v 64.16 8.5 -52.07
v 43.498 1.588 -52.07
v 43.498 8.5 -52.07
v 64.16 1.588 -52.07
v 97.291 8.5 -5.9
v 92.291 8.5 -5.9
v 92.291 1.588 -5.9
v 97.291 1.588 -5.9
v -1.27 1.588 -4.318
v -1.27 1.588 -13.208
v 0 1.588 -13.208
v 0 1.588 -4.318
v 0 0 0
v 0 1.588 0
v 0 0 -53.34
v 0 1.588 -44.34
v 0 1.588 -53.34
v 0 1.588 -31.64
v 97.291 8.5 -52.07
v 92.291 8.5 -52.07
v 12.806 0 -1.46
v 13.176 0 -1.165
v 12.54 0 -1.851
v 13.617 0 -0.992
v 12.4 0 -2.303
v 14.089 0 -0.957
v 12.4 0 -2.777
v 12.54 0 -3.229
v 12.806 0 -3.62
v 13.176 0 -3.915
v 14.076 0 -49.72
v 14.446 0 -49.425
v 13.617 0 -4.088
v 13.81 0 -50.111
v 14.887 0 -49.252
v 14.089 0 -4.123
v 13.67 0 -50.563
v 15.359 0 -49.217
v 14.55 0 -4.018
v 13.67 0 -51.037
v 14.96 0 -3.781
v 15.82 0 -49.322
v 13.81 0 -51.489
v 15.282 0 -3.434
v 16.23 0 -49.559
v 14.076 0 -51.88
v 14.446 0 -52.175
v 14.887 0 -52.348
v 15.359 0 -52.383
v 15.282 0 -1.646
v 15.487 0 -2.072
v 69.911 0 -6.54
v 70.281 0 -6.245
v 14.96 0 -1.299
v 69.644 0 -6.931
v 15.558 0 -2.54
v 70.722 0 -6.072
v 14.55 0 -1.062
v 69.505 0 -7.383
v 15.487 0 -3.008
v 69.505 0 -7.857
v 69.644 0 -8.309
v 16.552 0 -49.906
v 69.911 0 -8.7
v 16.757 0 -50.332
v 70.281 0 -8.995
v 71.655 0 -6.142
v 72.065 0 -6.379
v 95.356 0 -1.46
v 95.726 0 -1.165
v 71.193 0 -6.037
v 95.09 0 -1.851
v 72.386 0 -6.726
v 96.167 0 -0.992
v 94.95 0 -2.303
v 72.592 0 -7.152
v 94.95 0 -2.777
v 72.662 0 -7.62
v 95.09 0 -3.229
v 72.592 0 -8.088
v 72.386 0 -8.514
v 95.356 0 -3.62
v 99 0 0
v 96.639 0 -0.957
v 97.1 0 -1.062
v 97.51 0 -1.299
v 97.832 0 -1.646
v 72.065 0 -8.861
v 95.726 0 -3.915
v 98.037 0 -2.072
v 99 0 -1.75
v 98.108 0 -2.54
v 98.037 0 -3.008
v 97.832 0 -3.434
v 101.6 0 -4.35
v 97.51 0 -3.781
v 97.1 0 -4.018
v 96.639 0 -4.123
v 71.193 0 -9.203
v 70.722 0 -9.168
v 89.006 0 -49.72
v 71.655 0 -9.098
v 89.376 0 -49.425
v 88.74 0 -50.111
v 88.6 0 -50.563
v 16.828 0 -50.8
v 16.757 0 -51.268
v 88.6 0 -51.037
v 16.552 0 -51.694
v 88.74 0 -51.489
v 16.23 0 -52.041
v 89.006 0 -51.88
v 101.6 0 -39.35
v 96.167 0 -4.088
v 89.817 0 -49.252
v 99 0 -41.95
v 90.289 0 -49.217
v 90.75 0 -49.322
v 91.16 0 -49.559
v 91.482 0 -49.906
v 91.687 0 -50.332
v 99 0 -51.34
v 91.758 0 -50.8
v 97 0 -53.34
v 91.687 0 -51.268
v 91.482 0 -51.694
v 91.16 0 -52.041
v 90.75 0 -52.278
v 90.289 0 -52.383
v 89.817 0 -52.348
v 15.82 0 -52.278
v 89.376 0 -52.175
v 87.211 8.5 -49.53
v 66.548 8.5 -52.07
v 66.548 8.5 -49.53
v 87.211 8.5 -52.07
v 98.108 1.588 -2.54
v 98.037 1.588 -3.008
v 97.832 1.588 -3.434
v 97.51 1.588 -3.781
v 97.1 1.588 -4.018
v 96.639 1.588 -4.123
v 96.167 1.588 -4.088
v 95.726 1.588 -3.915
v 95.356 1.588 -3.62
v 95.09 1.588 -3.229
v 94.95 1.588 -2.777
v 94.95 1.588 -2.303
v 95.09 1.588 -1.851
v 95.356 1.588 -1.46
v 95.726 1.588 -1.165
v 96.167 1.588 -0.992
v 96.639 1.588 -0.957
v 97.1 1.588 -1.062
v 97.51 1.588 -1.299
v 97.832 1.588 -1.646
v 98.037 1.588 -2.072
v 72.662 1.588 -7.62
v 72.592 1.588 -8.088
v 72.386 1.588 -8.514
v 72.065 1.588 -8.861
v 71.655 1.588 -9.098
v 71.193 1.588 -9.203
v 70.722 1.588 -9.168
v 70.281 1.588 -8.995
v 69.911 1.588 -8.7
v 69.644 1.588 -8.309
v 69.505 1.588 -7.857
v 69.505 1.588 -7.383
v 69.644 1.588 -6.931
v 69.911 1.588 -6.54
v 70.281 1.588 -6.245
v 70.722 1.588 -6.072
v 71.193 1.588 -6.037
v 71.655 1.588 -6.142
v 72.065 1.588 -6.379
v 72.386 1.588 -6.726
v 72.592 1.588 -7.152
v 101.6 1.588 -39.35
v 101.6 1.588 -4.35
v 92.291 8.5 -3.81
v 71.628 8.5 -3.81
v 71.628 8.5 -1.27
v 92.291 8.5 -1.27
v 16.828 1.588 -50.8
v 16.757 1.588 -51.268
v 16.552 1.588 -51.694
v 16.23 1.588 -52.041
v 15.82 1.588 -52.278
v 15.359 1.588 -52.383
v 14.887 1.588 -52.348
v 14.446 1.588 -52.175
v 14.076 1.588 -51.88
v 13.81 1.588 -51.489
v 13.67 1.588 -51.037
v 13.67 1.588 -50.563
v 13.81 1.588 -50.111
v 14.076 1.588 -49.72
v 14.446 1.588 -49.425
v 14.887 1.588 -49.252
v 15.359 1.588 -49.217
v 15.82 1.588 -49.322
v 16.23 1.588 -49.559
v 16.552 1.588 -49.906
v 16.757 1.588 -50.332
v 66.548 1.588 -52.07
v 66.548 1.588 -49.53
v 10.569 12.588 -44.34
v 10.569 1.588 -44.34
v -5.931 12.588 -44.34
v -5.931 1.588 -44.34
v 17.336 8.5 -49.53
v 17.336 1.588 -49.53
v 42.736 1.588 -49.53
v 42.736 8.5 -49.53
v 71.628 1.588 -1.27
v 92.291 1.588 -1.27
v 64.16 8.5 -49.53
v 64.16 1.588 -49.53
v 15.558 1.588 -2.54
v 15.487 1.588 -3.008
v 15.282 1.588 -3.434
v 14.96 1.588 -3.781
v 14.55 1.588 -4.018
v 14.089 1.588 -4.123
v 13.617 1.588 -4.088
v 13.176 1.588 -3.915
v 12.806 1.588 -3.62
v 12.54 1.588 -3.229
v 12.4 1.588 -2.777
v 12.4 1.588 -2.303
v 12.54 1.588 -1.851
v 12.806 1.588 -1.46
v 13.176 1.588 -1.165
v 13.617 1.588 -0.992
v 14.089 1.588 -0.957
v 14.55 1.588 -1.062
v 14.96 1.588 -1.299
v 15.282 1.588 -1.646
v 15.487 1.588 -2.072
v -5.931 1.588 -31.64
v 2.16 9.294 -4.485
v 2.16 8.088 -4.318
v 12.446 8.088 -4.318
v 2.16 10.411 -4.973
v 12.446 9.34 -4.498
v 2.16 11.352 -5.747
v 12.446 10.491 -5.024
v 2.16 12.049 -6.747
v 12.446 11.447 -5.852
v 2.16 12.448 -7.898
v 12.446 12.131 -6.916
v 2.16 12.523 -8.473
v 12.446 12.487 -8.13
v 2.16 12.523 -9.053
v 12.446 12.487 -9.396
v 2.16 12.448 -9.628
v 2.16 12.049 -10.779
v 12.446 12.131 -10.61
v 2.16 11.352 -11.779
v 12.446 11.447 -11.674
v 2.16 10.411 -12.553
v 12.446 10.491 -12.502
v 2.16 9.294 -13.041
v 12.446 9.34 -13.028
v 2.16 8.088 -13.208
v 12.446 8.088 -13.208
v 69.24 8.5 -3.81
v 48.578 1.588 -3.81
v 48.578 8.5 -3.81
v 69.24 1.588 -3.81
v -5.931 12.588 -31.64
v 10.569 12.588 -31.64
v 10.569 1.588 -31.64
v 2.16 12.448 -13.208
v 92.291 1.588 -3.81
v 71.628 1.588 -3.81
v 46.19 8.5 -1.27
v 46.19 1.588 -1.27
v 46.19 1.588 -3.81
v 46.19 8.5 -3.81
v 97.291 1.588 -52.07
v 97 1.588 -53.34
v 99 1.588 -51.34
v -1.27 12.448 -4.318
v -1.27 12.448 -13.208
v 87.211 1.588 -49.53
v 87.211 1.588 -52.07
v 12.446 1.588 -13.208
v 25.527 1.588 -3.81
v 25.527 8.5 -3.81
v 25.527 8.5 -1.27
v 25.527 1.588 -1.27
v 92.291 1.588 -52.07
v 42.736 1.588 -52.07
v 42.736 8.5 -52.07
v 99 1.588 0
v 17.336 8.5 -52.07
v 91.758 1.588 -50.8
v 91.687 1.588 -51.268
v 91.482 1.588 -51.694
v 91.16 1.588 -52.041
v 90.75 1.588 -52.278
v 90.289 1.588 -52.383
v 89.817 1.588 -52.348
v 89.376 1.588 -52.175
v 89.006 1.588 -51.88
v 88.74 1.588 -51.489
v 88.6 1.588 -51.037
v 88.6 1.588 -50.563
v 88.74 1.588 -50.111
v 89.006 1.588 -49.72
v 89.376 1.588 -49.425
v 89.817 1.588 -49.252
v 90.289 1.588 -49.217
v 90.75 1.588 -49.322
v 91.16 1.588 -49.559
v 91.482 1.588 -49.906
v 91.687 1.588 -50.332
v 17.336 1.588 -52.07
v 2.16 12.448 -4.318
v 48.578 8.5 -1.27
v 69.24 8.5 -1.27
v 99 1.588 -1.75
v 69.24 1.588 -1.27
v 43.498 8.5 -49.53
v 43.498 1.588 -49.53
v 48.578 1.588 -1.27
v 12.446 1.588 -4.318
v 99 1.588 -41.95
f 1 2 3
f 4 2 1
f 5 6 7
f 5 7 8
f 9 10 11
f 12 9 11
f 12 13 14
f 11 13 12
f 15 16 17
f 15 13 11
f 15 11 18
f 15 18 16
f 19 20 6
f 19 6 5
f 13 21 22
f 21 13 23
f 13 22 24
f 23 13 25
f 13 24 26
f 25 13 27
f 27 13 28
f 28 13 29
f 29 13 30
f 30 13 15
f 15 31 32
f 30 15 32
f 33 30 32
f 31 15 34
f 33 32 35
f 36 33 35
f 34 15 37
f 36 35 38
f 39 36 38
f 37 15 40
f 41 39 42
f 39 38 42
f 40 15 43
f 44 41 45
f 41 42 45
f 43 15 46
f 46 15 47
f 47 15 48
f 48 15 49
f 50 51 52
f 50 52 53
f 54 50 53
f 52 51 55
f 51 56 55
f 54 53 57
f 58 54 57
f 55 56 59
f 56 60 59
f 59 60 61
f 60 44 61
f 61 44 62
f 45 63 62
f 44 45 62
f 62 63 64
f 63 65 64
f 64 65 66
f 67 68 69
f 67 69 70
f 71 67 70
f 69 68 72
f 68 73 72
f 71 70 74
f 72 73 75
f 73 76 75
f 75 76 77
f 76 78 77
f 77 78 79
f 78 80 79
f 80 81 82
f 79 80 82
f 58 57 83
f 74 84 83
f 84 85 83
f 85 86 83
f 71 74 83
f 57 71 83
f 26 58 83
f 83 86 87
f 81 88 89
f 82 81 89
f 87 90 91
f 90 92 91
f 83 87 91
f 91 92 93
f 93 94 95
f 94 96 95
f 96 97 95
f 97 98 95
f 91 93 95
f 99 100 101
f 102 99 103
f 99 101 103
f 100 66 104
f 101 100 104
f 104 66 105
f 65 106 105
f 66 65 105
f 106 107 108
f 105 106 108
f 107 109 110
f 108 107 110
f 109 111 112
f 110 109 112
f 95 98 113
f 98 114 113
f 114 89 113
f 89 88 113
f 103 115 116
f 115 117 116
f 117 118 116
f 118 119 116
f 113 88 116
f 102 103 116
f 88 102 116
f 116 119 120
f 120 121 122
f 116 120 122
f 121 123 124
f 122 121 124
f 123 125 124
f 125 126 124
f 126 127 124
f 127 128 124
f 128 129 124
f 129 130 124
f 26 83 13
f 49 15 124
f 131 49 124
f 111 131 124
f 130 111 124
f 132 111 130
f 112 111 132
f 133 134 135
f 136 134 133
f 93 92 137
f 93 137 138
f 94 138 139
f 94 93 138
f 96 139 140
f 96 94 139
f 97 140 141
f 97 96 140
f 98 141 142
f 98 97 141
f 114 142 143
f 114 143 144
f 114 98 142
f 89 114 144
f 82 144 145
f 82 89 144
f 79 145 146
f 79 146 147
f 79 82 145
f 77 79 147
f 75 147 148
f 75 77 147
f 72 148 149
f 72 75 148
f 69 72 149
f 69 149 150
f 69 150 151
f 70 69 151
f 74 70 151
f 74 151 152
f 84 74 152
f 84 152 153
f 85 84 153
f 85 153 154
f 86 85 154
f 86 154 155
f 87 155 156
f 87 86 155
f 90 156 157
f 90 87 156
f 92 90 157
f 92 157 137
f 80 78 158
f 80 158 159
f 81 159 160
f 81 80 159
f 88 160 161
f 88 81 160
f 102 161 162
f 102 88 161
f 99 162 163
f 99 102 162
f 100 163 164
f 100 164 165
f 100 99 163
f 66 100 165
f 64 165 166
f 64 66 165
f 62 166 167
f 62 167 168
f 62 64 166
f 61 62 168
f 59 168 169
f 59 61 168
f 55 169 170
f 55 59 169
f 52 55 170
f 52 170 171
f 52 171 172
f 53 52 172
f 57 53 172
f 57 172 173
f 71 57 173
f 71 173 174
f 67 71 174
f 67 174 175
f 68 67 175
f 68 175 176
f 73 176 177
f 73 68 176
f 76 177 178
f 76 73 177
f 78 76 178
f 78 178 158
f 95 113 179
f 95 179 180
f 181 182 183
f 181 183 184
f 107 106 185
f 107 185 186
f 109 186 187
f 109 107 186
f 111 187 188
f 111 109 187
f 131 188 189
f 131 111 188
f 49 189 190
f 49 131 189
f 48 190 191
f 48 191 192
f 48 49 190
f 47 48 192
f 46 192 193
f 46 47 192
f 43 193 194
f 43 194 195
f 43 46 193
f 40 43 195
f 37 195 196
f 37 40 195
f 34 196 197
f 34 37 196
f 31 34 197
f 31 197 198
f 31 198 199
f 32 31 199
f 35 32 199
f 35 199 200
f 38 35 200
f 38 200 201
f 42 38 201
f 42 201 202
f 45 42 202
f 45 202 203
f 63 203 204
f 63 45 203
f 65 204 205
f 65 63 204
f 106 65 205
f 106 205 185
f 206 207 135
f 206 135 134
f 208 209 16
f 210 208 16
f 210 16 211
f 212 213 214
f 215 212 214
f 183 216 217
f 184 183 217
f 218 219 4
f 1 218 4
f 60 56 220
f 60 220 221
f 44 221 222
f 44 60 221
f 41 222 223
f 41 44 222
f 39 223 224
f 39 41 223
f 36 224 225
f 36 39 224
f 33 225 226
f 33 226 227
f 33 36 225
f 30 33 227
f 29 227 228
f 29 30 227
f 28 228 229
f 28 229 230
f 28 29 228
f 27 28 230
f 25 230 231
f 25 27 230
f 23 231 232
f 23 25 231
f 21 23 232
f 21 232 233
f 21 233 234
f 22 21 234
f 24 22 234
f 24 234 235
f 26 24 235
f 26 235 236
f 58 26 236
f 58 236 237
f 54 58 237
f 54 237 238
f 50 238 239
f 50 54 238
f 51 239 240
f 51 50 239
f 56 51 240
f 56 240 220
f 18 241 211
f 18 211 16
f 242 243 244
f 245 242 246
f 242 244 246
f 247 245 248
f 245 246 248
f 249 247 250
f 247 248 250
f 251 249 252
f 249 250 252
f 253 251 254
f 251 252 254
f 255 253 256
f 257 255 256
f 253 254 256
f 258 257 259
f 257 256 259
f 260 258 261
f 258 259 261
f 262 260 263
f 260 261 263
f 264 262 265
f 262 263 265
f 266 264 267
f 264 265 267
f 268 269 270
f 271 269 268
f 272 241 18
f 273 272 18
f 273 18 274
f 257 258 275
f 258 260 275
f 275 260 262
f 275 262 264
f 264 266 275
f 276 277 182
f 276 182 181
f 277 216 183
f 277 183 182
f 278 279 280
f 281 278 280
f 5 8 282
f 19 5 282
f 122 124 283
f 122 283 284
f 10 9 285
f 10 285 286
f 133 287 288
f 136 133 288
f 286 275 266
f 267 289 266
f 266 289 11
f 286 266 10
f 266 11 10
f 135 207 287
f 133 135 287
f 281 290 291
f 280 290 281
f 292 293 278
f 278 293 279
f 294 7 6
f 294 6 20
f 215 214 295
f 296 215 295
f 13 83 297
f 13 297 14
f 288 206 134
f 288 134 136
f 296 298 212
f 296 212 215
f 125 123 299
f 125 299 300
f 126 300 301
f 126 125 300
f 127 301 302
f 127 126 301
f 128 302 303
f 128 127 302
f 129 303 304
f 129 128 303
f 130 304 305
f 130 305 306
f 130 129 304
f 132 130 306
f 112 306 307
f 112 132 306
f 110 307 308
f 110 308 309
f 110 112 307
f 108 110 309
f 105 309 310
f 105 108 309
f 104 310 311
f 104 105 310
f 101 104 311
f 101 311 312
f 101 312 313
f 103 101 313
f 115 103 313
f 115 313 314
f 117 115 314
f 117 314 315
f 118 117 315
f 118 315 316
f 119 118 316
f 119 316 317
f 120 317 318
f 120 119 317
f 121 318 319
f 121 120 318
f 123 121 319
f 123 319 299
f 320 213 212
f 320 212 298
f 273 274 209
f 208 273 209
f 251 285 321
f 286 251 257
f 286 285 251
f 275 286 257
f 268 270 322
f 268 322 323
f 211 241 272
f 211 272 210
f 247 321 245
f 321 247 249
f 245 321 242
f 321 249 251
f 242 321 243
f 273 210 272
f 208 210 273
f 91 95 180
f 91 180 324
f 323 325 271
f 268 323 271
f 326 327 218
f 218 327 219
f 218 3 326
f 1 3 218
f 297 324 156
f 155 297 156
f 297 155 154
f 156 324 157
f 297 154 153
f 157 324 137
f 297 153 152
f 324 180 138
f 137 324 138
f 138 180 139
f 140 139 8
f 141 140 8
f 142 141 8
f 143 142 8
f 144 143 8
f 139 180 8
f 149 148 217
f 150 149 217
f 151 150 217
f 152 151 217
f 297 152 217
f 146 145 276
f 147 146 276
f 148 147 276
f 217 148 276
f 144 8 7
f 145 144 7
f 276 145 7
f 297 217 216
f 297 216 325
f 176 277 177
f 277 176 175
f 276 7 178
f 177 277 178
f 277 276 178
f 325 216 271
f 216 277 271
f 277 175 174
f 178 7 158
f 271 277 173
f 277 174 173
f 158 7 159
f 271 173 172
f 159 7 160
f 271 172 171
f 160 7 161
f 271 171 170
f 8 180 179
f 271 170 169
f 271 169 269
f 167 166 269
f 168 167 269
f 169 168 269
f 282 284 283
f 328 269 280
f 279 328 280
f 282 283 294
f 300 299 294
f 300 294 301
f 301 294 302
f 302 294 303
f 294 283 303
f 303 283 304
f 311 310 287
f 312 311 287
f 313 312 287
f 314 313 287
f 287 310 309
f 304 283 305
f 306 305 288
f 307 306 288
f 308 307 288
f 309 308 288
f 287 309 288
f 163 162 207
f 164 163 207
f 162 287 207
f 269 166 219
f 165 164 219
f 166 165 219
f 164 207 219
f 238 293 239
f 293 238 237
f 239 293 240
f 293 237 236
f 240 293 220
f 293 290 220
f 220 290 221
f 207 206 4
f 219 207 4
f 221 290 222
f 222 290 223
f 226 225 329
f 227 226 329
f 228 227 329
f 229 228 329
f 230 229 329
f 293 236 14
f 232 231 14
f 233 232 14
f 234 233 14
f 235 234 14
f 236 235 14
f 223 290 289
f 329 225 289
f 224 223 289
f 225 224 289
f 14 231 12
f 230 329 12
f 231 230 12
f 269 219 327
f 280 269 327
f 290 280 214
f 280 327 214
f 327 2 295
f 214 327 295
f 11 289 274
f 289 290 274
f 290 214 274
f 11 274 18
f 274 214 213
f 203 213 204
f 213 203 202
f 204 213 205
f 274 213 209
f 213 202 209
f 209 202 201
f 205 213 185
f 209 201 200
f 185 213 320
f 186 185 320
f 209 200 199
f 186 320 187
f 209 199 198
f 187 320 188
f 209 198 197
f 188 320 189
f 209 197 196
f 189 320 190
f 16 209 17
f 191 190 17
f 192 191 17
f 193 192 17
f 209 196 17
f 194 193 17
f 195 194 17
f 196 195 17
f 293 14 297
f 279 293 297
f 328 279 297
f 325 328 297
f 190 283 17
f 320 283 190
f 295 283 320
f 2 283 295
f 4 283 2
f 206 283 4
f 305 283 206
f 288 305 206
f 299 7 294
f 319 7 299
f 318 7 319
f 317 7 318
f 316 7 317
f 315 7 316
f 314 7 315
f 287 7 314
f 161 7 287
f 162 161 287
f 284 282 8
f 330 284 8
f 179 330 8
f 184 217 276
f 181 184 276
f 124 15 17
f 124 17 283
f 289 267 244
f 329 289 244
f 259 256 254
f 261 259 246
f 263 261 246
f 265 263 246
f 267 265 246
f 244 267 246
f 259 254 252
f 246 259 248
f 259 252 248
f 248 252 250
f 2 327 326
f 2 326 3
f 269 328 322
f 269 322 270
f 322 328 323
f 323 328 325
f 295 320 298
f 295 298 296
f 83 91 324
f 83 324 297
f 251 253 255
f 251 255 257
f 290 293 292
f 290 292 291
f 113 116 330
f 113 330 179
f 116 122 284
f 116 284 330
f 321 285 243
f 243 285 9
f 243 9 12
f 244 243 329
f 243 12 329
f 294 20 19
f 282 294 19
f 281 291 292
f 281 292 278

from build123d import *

# Parameters (mm, degrees)
SKETCH1_R           = 1.5875
BOSS_EXTRUDE1_DEPTH = 1.5875
BOSS_EXTRUDE2_START = 1.5875
SKETCH1_3_W         = 5.9309
SKETCH1_3_H         = 12.7
SKETCH1_3_W_2       = 10.5691
BOSS_EXTRUDE2_DEPTH = 11
BOSS_EXTRUDE3_START = 1.5875
SKETCH1_4_W         = 10.286
SKETCH1_4_H         = 8.89
BOSS_EXTRUDE3_DEPTH = 6.5
BOSS_EXTRUDE4_START = 1.5875
SKETCH1_5_W         = 1.27
SKETCH1_5_H         = 8.89
SKETCH1_5_W_2       = 2.16
BOSS_EXTRUDE4_DEPTH = 10.86
SKETCH2_W           = 10.286
SKETCH2_H           = 4.445
REVOLVE1_ANGLE      = 180
SKETCH1_6_W         = 20.6629
SKETCH1_6_H         = 2.54
SKETCH1_6_W_2       = 5
SKETCH1_6_H_2       = 46.17
SKETCH1_6_W_3       = 25.4
BOSS_EXTRUDE5_DEPTH = 8.5


with BuildPart() as part:
    # Sketch1 → Boss-Extrude1 (new body)
    with BuildSketch(Plane(origin=(0, 0, 0), x_dir=(1, 0, 0), z_dir=(0, 1, 0))):
        Polygon((0, 0), (0, 53.34), (97, 53.34), (99, 51.34), (99, 41.95), (101.6, 39.35), (101.6, 4.35), (99, 1.75), (99, 0), align=None)
        with Locations((96.52, 2.54)):
            Circle(SKETCH1_R, mode=Mode.SUBTRACT)
        with Locations((71.074776633, 7.62)):
            Circle(SKETCH1_R, mode=Mode.SUBTRACT)
        with Locations((13.97, 2.54)):
            Circle(SKETCH1_R, mode=Mode.SUBTRACT)
        with Locations((15.24, 50.8)):
            Circle(SKETCH1_R, mode=Mode.SUBTRACT)
        with Locations((90.17, 50.8)):
            Circle(SKETCH1_R, mode=Mode.SUBTRACT)
    extrude(amount=BOSS_EXTRUDE1_DEPTH)

    # Sketch1<3> → Boss-Extrude2 (add)
    with BuildSketch(Plane(origin=(0, 0, 0), x_dir=(1, 0, 0), z_dir=(0, 1, 0)).offset(BOSS_EXTRUDE2_START)):
        with Locations((-2.96545, 37.99)):
            Rectangle(SKETCH1_3_W, SKETCH1_3_H)
        with Locations((5.28455, 37.99)):
            Rectangle(SKETCH1_3_W_2, SKETCH1_3_H)
    extrude(amount=BOSS_EXTRUDE2_DEPTH)

    # Sketch1<4> → Boss-Extrude3 (add)
    with BuildSketch(Plane(origin=(0, 0, 0), x_dir=(1, 0, 0), z_dir=(0, 1, 0)).offset(BOSS_EXTRUDE3_START)):
        with Locations((7.303, 8.763)):
            Rectangle(SKETCH1_4_W, SKETCH1_4_H)
    extrude(amount=BOSS_EXTRUDE3_DEPTH)

    # Sketch1<5> → Boss-Extrude4 (add)
    with BuildSketch(Plane(origin=(0, 0, 0), x_dir=(1, 0, 0), z_dir=(0, 1, 0)).offset(BOSS_EXTRUDE4_START)):
        with Locations((-0.635, 8.763)):
            Rectangle(SKETCH1_5_W, SKETCH1_5_H)
        with Locations((1.08, 8.763)):
            Rectangle(SKETCH1_5_W_2, SKETCH1_5_H)
    extrude(amount=BOSS_EXTRUDE4_DEPTH)

    # Sketch2 → Revolve1 (revolve)
    with BuildSketch(Plane(origin=(0, 8.0875, 0), x_dir=(1, 0, 0), z_dir=(0, 1, 0))):
        with Locations((7.303, 6.5405)):
            Rectangle(SKETCH2_W, SKETCH2_H)
    revolve(axis=Axis((2.16, 8.0875, -8.763), (-1, 0, 0)), revolution_arc=REVOLVE1_ANGLE)

    # Sketch1<6> → Boss-Extrude5 (add)
    with BuildSketch(Plane(origin=(0, 0, 0), x_dir=(1, 0, 0), z_dir=(0, 1, 0))):
        with Locations((58.90895, 2.54)):
            Rectangle(SKETCH1_6_W, SKETCH1_6_H)
        with Locations((81.95945, 2.54)):
            Rectangle(SKETCH1_6_W, SKETCH1_6_H)
        with Locations((94.7909, 28.985)):
            Rectangle(SKETCH1_6_W_2, SKETCH1_6_H_2)
        with Locations((35.85845, 2.54)):
            Rectangle(SKETCH1_6_W, SKETCH1_6_H)
        with Locations((76.87945, 50.8)):
            Rectangle(SKETCH1_6_W, SKETCH1_6_H)
        with Locations((53.82895, 50.8)):
            Rectangle(SKETCH1_6_W, SKETCH1_6_H)
        with Locations((30.0355, 50.8)):
            Rectangle(SKETCH1_6_W_3, SKETCH1_6_H)
    extrude(amount=BOSS_EXTRUDE5_DEPTH)


solid = part.part
